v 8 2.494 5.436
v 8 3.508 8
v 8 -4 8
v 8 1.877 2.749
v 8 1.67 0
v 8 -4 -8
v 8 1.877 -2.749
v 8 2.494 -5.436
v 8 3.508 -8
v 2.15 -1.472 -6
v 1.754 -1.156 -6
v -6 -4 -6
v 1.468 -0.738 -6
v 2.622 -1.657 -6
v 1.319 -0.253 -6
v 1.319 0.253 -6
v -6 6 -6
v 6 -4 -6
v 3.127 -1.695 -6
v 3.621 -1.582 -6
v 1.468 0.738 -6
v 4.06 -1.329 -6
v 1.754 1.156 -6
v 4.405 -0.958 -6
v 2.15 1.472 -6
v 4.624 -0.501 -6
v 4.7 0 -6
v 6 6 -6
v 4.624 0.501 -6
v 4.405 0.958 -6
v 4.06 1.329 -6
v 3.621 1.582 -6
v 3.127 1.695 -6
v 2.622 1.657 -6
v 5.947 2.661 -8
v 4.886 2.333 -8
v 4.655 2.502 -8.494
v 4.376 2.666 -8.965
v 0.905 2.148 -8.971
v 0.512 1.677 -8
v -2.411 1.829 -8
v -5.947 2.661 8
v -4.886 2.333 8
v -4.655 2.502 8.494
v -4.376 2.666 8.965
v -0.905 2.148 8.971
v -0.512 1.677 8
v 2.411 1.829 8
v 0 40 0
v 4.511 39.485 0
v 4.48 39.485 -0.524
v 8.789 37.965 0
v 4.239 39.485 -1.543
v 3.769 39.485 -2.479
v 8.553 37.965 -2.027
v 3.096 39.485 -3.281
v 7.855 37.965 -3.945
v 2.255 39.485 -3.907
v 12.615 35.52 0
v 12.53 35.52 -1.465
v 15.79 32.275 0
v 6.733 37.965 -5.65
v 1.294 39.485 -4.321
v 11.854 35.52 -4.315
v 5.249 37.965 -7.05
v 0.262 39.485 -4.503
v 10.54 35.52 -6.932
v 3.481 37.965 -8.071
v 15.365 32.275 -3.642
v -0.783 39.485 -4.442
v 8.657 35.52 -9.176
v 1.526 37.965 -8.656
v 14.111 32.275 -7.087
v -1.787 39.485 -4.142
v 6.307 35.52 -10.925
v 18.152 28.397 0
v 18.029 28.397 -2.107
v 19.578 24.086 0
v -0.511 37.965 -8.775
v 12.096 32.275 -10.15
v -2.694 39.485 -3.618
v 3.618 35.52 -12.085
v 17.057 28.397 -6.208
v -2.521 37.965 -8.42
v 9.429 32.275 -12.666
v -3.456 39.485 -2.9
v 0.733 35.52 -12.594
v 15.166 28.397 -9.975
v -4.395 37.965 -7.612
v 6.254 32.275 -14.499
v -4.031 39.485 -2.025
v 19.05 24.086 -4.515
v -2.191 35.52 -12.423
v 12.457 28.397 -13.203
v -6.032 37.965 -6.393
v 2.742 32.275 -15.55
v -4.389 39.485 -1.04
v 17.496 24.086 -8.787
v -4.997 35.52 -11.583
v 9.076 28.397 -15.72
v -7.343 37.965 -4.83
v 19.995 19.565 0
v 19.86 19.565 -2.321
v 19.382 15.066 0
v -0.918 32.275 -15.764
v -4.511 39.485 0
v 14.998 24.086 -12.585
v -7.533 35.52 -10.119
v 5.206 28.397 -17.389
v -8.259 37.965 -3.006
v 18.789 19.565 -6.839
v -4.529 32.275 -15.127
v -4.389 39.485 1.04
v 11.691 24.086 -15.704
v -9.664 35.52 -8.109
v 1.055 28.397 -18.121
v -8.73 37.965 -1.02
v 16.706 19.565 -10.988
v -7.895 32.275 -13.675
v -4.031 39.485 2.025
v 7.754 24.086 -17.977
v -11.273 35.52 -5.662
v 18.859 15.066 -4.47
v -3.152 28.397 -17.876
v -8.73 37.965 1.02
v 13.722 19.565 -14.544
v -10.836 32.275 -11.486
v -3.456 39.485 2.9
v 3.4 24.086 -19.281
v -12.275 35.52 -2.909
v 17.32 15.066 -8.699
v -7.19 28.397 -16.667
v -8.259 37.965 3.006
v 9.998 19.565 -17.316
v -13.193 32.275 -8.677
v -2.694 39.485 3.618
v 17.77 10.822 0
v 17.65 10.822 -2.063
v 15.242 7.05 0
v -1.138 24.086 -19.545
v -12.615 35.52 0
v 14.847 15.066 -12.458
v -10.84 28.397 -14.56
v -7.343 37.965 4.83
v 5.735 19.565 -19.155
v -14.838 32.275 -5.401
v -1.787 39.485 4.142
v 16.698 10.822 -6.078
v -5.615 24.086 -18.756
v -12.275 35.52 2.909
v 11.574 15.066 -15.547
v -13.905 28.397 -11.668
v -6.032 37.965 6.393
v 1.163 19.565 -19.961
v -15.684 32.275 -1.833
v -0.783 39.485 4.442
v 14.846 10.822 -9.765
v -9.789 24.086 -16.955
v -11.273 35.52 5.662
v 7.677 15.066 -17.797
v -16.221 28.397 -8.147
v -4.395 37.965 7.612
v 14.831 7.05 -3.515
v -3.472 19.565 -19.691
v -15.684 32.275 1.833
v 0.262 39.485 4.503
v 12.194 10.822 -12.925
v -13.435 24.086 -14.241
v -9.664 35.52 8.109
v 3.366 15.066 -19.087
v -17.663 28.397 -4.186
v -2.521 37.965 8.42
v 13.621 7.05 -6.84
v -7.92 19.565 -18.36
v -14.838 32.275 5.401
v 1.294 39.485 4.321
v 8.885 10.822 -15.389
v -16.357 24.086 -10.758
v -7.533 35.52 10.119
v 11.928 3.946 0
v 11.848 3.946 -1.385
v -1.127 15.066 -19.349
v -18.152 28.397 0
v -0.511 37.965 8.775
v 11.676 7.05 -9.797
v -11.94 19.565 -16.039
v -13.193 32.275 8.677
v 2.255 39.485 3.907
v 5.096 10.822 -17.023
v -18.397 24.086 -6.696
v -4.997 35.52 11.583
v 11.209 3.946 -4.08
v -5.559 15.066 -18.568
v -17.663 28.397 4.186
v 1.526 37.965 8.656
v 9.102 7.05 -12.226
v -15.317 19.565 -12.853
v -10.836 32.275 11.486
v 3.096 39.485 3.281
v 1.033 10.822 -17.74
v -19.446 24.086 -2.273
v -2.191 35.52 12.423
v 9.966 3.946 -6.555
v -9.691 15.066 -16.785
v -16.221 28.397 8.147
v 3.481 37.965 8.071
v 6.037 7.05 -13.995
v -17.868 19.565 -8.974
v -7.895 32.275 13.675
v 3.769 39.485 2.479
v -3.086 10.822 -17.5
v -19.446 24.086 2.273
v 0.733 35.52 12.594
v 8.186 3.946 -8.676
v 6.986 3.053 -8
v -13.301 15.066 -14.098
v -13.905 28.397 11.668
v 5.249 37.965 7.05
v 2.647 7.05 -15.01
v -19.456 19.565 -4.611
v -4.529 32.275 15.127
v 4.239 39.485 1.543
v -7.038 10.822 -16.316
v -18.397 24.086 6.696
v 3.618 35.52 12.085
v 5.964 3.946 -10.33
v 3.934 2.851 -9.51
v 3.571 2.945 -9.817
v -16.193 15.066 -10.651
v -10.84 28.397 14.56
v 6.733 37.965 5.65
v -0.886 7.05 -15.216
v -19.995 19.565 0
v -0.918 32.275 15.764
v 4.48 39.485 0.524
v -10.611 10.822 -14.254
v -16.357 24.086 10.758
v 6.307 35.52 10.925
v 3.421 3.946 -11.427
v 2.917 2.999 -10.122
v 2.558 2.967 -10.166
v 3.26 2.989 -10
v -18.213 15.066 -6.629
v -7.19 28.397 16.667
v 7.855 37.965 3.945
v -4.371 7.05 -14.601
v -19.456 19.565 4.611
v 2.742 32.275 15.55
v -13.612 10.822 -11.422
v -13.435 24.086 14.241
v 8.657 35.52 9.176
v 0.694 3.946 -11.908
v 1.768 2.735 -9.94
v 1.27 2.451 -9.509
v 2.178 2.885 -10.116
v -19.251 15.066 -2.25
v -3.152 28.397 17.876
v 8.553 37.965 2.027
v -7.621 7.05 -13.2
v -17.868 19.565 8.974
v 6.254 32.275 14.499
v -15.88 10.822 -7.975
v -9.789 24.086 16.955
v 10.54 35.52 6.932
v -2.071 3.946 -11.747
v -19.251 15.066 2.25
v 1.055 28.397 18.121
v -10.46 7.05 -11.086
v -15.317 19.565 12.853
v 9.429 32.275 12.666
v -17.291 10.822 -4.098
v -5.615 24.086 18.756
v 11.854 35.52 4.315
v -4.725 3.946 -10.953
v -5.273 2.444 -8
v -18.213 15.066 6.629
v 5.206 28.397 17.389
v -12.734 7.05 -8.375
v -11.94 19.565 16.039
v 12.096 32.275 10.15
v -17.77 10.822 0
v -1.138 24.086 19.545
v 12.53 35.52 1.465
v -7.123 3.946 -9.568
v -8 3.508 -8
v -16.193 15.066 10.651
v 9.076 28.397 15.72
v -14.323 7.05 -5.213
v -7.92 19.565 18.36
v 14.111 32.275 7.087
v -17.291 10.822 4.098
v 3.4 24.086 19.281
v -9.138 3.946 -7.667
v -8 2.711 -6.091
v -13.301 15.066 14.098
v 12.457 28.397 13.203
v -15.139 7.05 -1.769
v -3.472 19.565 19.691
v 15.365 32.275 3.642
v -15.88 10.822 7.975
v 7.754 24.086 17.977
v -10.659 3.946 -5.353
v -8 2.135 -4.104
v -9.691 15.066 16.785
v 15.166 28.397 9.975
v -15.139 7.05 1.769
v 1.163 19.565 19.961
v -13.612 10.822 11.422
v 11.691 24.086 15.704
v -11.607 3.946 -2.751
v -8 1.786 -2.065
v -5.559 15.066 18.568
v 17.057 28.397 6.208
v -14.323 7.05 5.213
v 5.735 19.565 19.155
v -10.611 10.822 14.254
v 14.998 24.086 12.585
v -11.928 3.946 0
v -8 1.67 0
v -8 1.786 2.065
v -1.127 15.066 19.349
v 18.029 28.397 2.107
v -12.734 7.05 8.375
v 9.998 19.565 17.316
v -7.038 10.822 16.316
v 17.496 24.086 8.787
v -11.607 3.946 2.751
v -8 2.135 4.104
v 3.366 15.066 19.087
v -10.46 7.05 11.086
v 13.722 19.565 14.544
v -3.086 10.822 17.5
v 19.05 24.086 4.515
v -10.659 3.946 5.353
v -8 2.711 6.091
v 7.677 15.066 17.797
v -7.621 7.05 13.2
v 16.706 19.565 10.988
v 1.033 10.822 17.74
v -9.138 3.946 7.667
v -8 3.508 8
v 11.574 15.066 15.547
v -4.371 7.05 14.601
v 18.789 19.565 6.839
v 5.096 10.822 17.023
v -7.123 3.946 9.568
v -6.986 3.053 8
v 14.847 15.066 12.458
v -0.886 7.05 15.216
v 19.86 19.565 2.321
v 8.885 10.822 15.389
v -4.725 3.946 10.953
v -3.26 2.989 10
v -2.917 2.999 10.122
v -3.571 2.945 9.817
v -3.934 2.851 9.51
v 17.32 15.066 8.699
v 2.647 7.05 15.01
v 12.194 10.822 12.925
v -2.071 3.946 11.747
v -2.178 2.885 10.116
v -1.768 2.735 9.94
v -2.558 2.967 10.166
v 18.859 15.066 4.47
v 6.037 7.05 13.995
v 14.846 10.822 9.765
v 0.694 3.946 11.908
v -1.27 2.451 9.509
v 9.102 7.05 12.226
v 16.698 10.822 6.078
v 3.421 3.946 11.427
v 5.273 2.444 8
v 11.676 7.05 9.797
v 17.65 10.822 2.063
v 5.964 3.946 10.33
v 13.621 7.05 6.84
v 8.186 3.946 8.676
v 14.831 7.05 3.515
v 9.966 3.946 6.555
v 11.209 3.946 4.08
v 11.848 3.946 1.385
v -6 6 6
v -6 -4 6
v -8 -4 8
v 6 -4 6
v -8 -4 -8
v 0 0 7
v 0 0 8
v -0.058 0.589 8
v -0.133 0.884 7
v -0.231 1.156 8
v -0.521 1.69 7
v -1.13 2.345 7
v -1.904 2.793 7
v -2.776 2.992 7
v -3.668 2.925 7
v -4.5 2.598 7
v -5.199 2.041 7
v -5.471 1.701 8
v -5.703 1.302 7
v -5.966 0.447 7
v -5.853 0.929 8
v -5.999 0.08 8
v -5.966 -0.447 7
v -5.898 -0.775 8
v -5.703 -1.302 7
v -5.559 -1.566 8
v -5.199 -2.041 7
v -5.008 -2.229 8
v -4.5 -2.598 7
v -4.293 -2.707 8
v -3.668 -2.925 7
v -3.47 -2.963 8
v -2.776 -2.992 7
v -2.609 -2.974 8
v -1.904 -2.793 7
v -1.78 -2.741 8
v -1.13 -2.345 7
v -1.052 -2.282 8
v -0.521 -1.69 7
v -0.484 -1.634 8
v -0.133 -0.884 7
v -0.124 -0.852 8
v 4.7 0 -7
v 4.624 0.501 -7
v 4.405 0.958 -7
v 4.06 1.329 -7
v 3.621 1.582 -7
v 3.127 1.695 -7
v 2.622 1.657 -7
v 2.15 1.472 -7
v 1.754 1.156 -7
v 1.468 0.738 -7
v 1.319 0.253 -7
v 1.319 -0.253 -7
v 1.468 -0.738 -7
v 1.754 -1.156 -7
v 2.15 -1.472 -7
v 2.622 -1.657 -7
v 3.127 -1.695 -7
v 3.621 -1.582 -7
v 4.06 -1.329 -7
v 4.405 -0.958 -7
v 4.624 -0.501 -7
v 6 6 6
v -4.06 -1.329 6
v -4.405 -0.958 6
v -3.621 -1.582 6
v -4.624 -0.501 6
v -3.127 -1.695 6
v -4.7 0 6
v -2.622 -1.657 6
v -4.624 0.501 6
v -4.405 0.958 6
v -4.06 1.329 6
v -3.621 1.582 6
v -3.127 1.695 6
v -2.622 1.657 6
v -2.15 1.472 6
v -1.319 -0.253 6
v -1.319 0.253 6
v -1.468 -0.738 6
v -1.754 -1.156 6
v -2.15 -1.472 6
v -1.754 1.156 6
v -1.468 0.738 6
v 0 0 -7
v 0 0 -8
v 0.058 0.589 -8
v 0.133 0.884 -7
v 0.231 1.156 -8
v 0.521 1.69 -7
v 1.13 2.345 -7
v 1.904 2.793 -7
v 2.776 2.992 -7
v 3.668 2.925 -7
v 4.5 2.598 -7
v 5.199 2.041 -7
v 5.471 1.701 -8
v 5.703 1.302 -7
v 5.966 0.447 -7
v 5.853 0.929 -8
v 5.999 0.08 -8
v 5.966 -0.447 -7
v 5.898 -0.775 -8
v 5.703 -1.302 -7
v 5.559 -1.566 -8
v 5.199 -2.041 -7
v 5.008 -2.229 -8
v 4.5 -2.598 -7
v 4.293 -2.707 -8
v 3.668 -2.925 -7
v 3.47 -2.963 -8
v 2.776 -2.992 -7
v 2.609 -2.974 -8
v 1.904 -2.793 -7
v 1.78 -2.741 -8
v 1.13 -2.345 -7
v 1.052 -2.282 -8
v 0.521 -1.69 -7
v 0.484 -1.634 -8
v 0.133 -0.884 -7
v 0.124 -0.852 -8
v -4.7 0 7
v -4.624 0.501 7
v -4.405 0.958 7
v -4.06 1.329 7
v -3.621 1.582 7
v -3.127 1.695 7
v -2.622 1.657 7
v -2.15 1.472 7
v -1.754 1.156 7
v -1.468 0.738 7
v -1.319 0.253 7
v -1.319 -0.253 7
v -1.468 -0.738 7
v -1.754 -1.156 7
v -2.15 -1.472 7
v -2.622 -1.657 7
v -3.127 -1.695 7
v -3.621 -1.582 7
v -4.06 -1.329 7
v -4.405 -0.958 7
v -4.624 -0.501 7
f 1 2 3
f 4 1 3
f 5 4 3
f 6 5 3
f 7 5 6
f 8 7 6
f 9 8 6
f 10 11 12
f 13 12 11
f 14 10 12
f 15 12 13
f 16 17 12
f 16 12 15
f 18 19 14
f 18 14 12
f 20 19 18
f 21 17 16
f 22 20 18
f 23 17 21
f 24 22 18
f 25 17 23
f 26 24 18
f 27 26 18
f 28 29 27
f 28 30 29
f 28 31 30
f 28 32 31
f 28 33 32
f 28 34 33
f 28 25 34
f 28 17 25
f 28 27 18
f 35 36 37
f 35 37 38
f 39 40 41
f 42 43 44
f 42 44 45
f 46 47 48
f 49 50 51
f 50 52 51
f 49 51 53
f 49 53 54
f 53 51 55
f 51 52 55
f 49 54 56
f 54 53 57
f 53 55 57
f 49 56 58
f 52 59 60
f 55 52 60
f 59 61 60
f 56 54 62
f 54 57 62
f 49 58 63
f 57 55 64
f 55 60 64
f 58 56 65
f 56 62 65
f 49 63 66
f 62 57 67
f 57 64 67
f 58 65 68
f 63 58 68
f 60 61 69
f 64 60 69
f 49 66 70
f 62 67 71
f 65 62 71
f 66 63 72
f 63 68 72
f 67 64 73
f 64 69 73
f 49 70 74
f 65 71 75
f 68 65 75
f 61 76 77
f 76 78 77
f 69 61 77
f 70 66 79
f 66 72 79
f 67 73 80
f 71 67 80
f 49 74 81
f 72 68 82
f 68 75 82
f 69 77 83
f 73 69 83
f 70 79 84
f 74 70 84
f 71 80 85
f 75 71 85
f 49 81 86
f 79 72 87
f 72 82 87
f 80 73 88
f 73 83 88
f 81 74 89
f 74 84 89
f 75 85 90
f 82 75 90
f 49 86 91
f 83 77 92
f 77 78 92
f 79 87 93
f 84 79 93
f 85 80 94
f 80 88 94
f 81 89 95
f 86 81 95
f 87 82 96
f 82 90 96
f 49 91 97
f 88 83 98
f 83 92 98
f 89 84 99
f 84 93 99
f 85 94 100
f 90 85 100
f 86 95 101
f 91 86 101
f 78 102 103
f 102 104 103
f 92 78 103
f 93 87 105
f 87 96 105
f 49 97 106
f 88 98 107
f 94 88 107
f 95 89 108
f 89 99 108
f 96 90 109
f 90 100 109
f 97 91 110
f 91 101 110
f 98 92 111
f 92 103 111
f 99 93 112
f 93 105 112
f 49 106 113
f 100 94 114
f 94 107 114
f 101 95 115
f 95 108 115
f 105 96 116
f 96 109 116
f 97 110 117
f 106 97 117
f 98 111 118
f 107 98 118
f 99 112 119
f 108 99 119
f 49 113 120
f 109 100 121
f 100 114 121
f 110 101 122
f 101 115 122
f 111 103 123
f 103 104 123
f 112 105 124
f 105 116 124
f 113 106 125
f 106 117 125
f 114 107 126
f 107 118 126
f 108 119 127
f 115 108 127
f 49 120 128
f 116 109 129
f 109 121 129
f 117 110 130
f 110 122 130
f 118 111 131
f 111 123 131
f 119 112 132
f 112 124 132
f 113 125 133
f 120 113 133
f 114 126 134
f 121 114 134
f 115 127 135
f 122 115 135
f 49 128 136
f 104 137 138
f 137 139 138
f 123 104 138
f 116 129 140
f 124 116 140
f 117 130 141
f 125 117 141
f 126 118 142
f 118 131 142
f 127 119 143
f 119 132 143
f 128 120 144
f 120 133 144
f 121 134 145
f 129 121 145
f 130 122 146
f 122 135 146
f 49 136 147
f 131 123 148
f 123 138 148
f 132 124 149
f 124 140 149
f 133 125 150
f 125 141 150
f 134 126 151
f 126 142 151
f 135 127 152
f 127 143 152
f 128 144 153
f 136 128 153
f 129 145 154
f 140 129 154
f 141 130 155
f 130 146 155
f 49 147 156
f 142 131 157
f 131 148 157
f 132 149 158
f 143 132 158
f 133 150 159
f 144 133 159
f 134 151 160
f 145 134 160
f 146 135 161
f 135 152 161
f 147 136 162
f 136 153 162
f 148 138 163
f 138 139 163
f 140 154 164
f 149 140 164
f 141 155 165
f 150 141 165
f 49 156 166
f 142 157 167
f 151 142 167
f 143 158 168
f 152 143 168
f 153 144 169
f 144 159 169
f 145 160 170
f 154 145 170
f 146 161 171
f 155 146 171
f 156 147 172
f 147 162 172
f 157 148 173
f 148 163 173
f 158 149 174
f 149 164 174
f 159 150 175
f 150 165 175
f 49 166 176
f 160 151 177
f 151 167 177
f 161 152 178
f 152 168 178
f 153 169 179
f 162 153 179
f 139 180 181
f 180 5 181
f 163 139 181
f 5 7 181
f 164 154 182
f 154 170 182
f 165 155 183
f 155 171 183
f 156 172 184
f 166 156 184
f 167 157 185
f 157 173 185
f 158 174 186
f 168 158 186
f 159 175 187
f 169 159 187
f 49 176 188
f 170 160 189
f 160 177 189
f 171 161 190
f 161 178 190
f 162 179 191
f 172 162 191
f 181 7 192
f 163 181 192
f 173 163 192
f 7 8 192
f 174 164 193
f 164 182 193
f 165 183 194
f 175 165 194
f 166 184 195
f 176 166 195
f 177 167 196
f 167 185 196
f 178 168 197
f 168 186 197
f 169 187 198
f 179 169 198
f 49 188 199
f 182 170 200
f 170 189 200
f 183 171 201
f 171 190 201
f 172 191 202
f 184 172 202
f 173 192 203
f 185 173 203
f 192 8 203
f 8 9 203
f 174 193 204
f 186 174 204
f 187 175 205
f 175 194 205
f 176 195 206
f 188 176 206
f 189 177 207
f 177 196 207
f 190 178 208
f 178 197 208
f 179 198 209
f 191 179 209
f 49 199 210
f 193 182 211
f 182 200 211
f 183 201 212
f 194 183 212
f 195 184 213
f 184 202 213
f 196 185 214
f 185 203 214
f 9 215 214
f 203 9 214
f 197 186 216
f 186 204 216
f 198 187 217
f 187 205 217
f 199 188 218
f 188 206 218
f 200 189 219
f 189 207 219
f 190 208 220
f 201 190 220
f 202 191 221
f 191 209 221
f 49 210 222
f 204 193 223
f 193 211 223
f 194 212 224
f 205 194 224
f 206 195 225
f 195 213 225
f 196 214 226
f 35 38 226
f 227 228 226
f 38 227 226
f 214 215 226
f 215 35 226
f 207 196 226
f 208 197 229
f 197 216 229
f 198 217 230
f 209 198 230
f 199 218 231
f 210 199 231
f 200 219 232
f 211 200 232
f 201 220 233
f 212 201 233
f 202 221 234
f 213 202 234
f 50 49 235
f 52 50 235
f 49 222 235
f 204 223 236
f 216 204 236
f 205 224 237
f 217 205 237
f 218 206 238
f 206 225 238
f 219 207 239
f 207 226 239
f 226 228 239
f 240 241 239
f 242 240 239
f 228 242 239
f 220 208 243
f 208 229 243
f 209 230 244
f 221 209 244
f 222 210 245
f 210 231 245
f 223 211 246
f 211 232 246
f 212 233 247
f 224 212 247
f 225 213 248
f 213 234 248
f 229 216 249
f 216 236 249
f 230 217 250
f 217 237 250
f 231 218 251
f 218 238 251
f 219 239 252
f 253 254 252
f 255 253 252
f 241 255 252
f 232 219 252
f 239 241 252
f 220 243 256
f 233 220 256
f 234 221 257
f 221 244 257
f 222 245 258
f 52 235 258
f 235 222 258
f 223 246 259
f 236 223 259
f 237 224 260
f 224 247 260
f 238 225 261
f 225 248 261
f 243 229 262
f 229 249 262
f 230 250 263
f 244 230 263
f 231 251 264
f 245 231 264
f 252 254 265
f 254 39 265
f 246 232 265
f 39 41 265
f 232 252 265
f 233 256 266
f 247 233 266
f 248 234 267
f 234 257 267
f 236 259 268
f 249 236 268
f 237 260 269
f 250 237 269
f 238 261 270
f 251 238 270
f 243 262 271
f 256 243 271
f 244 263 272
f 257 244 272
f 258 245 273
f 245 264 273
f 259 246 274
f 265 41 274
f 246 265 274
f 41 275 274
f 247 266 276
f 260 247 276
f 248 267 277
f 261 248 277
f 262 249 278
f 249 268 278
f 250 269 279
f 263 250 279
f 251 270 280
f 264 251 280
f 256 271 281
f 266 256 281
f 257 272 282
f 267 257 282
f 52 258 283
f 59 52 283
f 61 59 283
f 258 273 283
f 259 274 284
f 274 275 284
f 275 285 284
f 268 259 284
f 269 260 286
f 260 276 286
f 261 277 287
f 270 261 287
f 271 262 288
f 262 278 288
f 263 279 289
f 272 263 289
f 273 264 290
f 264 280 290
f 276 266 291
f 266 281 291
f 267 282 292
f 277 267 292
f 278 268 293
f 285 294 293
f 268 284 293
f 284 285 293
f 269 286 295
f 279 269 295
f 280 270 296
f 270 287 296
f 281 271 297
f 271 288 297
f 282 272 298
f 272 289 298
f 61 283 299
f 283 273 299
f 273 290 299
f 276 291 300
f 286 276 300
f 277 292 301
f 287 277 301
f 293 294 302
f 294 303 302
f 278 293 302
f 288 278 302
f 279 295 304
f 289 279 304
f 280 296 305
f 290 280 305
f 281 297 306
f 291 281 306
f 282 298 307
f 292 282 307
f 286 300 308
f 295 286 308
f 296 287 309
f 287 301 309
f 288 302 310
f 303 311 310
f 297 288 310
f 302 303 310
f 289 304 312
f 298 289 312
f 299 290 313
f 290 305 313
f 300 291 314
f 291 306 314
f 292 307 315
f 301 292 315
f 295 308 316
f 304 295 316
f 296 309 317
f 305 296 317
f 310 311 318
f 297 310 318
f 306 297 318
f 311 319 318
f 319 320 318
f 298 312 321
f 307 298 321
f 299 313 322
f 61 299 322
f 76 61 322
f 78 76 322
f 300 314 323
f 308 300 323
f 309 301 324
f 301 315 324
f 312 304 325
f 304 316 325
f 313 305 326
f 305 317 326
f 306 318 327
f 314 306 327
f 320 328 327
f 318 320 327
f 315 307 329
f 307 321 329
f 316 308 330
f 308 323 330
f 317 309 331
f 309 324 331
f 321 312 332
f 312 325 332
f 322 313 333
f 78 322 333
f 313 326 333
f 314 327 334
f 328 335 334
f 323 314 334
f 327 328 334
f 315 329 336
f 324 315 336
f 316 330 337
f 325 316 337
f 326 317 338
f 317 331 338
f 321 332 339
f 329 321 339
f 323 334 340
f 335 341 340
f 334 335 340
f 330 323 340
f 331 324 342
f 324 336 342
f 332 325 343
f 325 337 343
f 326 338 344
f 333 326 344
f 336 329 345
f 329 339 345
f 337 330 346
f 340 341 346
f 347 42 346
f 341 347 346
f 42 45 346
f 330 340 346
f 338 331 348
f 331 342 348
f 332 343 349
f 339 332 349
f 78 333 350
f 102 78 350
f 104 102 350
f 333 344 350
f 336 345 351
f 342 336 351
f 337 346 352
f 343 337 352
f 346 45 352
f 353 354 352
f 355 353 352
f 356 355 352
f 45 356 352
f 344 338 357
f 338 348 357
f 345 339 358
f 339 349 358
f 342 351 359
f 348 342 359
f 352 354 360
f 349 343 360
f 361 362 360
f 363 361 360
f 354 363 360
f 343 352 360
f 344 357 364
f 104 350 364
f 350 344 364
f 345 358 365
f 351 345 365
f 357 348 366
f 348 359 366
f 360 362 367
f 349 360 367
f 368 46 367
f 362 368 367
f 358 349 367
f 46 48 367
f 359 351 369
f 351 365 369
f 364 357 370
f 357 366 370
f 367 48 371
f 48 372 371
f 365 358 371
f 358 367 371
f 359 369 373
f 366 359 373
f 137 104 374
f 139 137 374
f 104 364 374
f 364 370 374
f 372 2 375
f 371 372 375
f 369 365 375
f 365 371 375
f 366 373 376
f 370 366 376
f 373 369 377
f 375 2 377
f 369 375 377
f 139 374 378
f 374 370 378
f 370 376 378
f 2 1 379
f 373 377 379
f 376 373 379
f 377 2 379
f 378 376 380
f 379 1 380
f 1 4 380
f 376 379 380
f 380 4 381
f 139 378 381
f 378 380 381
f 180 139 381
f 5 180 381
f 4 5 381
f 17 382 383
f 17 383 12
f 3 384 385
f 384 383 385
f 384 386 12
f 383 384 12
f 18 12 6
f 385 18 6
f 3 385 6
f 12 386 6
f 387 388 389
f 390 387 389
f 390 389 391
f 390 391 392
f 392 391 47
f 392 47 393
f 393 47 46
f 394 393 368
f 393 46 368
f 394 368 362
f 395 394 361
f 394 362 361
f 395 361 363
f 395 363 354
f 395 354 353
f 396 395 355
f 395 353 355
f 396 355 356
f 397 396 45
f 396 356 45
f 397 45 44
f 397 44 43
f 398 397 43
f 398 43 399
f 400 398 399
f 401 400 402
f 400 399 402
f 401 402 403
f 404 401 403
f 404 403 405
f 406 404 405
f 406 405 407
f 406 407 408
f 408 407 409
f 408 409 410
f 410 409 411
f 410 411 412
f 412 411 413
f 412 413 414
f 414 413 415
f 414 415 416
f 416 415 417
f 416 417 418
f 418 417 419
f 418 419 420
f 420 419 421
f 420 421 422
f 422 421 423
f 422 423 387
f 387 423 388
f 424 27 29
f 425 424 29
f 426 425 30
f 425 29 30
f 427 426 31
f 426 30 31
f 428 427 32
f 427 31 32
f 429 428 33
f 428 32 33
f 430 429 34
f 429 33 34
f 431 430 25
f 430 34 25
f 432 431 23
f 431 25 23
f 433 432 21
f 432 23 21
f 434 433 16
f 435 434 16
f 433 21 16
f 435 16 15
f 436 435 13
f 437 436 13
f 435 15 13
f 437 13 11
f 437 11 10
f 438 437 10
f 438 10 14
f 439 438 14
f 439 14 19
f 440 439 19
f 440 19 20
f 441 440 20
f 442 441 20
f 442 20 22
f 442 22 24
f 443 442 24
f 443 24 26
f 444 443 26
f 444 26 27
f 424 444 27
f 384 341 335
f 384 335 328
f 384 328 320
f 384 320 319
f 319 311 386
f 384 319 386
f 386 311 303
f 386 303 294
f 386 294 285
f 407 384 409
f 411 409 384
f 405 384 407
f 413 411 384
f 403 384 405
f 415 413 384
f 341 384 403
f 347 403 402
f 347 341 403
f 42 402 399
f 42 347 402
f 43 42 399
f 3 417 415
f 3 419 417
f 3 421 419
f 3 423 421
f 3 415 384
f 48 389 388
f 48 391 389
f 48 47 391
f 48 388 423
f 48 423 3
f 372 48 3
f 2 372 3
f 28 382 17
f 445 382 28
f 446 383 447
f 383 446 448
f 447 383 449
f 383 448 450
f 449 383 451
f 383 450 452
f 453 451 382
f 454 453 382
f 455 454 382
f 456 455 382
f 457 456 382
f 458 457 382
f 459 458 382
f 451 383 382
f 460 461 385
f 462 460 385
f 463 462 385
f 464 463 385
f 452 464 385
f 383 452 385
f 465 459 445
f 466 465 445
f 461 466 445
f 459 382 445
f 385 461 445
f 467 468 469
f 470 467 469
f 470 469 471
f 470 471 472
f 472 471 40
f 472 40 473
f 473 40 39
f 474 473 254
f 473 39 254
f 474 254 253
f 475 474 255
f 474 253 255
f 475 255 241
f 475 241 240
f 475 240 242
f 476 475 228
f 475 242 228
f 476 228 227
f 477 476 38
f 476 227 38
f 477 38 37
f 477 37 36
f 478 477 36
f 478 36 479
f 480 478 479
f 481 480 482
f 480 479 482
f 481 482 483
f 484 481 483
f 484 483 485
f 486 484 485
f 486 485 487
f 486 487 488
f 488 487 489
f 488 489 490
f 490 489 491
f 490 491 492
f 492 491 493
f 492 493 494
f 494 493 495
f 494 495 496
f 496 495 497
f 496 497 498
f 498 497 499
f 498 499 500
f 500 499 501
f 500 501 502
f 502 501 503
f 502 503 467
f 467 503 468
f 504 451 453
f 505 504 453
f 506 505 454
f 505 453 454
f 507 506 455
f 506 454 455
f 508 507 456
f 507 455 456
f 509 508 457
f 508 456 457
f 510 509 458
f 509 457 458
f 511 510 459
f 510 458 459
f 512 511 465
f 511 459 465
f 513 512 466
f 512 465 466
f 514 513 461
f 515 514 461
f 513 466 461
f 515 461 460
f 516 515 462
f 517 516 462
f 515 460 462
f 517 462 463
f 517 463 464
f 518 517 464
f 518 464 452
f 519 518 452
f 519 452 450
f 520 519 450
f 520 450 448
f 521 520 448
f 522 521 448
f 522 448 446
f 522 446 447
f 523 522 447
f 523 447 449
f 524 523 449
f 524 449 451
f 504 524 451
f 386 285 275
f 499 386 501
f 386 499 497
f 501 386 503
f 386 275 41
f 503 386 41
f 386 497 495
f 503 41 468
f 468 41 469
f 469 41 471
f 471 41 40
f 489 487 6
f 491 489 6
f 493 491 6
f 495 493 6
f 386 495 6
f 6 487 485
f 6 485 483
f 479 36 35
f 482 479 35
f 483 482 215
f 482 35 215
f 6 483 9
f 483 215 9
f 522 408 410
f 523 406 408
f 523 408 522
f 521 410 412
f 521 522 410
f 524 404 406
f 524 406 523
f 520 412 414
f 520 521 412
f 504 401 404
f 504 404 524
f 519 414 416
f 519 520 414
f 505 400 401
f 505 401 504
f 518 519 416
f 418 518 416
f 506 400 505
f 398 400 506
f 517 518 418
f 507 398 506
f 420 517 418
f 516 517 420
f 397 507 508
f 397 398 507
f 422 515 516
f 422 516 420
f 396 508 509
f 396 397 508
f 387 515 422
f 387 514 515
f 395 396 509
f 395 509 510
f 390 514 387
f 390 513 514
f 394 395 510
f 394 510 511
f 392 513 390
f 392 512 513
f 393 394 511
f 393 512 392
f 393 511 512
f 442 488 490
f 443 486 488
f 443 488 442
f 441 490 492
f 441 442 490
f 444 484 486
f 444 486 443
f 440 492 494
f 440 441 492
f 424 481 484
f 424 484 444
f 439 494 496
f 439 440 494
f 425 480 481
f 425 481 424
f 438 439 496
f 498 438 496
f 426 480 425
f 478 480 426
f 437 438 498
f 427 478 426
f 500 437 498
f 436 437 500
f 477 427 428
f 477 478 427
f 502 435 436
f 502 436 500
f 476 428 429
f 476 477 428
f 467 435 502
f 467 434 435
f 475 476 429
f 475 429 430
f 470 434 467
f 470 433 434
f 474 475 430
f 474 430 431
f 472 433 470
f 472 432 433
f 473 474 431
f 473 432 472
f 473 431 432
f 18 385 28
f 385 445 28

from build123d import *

# Parameters (mm, degrees)
BOSS_EXTRUDE1_REACH             = 42
SKETCH2_W                       = 16
SKETCH2_H                       = 16
SKETCH2_W_2                     = 12
SKETCH2_H_2                     = 12
BOSS_EXTRUDE1_DIRECTION_2_DEPTH = 4
SKETCH3_W                       = 12
SKETCH3_H                       = 12
CUT_EXTRUDE1_DEPTH              = 10
SKETCH4_R                       = 1.7
CUT_EXTRUDE2_DEPTH              = 3
SKETCH5_R                       = 1.7
CUT_EXTRUDE3_DEPTH              = 3
SKETCH6_R                       = 3
CUT_EXTRUDE4_DEPTH              = 13
CUT_EXTRUDE4_DEPTH_BACK         = 1
SKETCH7_R                       = 3
CUT_EXTRUDE5_DEPTH              = 13
CUT_EXTRUDE5_DEPTH_BACK         = 1


with BuildPart() as part:
    # Sketch1 → Revolve1 (revolve)
    with BuildSketch(Plane.XY):
        with BuildLine():
            Line((0, 0), (0, 40))
            ThreePointArc((0, 40), (20, 20), (0, 0))
        make_face()
    revolve(axis=Axis((0, 0, 0), (0, 1, 0)))

    # Sketch2 → Boss-Extrude1 (add, up to next)
    with BuildSketch(Plane(origin=(0, 0, 0), x_dir=(1, 0, 0), z_dir=(0, 1, 0)), mode=Mode.PRIVATE) as boss_extrude1_sk1:
        Rectangle(SKETCH2_W, SKETCH2_H)
        Rectangle(SKETCH2_W_2, SKETCH2_H_2, mode=Mode.SUBTRACT)
    boss_extrude1_tool1 = extrude(boss_extrude1_sk1.sketch, amount=BOSS_EXTRUDE1_REACH, mode=Mode.PRIVATE) - part.part
    add(boss_extrude1_tool1.solids().sort_by_distance((0, 0, -7.773726))[0])

    # Sketch2 → Boss-Extrude1 direction 2 (add)
    with BuildSketch(Plane(origin=(0, 0, 0), x_dir=(1, 0, 0), z_dir=(0, 1, 0))):
        Rectangle(SKETCH2_W, SKETCH2_H)
        Rectangle(SKETCH2_W_2, SKETCH2_H_2, mode=Mode.SUBTRACT)
    extrude(amount=-BOSS_EXTRUDE1_DIRECTION_2_DEPTH)

    # Sketch3 → Cut-Extrude1 (cut)
    with BuildSketch(Plane.XZ.offset(4)):
        Rectangle(SKETCH3_W, SKETCH3_H)
    extrude(amount=-CUT_EXTRUDE1_DEPTH, mode=Mode.SUBTRACT)

    # Sketch4 → Cut-Extrude2 (cut)
    with BuildSketch(Plane(origin=(0, 0, 6), x_dir=(-1, 0, 0), z_dir=(0, 0, -1))):
        with Locations((3, 0)):
            Circle(SKETCH4_R)
    extrude(amount=-CUT_EXTRUDE2_DEPTH, mode=Mode.SUBTRACT)

    # Sketch5 → Cut-Extrude3 (cut)
    with BuildSketch(Plane.XY.offset(-6)):
        with Locations((3, 0)):
            Circle(SKETCH5_R)
    extrude(amount=-CUT_EXTRUDE3_DEPTH, mode=Mode.SUBTRACT)

    # Sketch6 → Cut-Extrude4 (cut, two sides)
    with BuildSketch(Plane(origin=(0, 0, -8), x_dir=(-1, 0, 0), z_dir=(0, 0, -1))) as cut_extrude4_sk:
        with Locations((-3, 0)):
            Circle(SKETCH6_R)
    extrude(amount=CUT_EXTRUDE4_DEPTH, mode=Mode.SUBTRACT)
    extrude(cut_extrude4_sk.sketch, amount=-CUT_EXTRUDE4_DEPTH_BACK, mode=Mode.SUBTRACT)

    # Sketch7 → Cut-Extrude5 (cut, two sides)
    with BuildSketch(Plane.XY.offset(8)) as cut_extrude5_sk:
        with Locations((-3, 0)):
            Circle(SKETCH7_R)
    extrude(amount=CUT_EXTRUDE5_DEPTH, mode=Mode.SUBTRACT)
    extrude(cut_extrude5_sk.sketch, amount=-CUT_EXTRUDE5_DEPTH_BACK, mode=Mode.SUBTRACT)


solid = part.part
